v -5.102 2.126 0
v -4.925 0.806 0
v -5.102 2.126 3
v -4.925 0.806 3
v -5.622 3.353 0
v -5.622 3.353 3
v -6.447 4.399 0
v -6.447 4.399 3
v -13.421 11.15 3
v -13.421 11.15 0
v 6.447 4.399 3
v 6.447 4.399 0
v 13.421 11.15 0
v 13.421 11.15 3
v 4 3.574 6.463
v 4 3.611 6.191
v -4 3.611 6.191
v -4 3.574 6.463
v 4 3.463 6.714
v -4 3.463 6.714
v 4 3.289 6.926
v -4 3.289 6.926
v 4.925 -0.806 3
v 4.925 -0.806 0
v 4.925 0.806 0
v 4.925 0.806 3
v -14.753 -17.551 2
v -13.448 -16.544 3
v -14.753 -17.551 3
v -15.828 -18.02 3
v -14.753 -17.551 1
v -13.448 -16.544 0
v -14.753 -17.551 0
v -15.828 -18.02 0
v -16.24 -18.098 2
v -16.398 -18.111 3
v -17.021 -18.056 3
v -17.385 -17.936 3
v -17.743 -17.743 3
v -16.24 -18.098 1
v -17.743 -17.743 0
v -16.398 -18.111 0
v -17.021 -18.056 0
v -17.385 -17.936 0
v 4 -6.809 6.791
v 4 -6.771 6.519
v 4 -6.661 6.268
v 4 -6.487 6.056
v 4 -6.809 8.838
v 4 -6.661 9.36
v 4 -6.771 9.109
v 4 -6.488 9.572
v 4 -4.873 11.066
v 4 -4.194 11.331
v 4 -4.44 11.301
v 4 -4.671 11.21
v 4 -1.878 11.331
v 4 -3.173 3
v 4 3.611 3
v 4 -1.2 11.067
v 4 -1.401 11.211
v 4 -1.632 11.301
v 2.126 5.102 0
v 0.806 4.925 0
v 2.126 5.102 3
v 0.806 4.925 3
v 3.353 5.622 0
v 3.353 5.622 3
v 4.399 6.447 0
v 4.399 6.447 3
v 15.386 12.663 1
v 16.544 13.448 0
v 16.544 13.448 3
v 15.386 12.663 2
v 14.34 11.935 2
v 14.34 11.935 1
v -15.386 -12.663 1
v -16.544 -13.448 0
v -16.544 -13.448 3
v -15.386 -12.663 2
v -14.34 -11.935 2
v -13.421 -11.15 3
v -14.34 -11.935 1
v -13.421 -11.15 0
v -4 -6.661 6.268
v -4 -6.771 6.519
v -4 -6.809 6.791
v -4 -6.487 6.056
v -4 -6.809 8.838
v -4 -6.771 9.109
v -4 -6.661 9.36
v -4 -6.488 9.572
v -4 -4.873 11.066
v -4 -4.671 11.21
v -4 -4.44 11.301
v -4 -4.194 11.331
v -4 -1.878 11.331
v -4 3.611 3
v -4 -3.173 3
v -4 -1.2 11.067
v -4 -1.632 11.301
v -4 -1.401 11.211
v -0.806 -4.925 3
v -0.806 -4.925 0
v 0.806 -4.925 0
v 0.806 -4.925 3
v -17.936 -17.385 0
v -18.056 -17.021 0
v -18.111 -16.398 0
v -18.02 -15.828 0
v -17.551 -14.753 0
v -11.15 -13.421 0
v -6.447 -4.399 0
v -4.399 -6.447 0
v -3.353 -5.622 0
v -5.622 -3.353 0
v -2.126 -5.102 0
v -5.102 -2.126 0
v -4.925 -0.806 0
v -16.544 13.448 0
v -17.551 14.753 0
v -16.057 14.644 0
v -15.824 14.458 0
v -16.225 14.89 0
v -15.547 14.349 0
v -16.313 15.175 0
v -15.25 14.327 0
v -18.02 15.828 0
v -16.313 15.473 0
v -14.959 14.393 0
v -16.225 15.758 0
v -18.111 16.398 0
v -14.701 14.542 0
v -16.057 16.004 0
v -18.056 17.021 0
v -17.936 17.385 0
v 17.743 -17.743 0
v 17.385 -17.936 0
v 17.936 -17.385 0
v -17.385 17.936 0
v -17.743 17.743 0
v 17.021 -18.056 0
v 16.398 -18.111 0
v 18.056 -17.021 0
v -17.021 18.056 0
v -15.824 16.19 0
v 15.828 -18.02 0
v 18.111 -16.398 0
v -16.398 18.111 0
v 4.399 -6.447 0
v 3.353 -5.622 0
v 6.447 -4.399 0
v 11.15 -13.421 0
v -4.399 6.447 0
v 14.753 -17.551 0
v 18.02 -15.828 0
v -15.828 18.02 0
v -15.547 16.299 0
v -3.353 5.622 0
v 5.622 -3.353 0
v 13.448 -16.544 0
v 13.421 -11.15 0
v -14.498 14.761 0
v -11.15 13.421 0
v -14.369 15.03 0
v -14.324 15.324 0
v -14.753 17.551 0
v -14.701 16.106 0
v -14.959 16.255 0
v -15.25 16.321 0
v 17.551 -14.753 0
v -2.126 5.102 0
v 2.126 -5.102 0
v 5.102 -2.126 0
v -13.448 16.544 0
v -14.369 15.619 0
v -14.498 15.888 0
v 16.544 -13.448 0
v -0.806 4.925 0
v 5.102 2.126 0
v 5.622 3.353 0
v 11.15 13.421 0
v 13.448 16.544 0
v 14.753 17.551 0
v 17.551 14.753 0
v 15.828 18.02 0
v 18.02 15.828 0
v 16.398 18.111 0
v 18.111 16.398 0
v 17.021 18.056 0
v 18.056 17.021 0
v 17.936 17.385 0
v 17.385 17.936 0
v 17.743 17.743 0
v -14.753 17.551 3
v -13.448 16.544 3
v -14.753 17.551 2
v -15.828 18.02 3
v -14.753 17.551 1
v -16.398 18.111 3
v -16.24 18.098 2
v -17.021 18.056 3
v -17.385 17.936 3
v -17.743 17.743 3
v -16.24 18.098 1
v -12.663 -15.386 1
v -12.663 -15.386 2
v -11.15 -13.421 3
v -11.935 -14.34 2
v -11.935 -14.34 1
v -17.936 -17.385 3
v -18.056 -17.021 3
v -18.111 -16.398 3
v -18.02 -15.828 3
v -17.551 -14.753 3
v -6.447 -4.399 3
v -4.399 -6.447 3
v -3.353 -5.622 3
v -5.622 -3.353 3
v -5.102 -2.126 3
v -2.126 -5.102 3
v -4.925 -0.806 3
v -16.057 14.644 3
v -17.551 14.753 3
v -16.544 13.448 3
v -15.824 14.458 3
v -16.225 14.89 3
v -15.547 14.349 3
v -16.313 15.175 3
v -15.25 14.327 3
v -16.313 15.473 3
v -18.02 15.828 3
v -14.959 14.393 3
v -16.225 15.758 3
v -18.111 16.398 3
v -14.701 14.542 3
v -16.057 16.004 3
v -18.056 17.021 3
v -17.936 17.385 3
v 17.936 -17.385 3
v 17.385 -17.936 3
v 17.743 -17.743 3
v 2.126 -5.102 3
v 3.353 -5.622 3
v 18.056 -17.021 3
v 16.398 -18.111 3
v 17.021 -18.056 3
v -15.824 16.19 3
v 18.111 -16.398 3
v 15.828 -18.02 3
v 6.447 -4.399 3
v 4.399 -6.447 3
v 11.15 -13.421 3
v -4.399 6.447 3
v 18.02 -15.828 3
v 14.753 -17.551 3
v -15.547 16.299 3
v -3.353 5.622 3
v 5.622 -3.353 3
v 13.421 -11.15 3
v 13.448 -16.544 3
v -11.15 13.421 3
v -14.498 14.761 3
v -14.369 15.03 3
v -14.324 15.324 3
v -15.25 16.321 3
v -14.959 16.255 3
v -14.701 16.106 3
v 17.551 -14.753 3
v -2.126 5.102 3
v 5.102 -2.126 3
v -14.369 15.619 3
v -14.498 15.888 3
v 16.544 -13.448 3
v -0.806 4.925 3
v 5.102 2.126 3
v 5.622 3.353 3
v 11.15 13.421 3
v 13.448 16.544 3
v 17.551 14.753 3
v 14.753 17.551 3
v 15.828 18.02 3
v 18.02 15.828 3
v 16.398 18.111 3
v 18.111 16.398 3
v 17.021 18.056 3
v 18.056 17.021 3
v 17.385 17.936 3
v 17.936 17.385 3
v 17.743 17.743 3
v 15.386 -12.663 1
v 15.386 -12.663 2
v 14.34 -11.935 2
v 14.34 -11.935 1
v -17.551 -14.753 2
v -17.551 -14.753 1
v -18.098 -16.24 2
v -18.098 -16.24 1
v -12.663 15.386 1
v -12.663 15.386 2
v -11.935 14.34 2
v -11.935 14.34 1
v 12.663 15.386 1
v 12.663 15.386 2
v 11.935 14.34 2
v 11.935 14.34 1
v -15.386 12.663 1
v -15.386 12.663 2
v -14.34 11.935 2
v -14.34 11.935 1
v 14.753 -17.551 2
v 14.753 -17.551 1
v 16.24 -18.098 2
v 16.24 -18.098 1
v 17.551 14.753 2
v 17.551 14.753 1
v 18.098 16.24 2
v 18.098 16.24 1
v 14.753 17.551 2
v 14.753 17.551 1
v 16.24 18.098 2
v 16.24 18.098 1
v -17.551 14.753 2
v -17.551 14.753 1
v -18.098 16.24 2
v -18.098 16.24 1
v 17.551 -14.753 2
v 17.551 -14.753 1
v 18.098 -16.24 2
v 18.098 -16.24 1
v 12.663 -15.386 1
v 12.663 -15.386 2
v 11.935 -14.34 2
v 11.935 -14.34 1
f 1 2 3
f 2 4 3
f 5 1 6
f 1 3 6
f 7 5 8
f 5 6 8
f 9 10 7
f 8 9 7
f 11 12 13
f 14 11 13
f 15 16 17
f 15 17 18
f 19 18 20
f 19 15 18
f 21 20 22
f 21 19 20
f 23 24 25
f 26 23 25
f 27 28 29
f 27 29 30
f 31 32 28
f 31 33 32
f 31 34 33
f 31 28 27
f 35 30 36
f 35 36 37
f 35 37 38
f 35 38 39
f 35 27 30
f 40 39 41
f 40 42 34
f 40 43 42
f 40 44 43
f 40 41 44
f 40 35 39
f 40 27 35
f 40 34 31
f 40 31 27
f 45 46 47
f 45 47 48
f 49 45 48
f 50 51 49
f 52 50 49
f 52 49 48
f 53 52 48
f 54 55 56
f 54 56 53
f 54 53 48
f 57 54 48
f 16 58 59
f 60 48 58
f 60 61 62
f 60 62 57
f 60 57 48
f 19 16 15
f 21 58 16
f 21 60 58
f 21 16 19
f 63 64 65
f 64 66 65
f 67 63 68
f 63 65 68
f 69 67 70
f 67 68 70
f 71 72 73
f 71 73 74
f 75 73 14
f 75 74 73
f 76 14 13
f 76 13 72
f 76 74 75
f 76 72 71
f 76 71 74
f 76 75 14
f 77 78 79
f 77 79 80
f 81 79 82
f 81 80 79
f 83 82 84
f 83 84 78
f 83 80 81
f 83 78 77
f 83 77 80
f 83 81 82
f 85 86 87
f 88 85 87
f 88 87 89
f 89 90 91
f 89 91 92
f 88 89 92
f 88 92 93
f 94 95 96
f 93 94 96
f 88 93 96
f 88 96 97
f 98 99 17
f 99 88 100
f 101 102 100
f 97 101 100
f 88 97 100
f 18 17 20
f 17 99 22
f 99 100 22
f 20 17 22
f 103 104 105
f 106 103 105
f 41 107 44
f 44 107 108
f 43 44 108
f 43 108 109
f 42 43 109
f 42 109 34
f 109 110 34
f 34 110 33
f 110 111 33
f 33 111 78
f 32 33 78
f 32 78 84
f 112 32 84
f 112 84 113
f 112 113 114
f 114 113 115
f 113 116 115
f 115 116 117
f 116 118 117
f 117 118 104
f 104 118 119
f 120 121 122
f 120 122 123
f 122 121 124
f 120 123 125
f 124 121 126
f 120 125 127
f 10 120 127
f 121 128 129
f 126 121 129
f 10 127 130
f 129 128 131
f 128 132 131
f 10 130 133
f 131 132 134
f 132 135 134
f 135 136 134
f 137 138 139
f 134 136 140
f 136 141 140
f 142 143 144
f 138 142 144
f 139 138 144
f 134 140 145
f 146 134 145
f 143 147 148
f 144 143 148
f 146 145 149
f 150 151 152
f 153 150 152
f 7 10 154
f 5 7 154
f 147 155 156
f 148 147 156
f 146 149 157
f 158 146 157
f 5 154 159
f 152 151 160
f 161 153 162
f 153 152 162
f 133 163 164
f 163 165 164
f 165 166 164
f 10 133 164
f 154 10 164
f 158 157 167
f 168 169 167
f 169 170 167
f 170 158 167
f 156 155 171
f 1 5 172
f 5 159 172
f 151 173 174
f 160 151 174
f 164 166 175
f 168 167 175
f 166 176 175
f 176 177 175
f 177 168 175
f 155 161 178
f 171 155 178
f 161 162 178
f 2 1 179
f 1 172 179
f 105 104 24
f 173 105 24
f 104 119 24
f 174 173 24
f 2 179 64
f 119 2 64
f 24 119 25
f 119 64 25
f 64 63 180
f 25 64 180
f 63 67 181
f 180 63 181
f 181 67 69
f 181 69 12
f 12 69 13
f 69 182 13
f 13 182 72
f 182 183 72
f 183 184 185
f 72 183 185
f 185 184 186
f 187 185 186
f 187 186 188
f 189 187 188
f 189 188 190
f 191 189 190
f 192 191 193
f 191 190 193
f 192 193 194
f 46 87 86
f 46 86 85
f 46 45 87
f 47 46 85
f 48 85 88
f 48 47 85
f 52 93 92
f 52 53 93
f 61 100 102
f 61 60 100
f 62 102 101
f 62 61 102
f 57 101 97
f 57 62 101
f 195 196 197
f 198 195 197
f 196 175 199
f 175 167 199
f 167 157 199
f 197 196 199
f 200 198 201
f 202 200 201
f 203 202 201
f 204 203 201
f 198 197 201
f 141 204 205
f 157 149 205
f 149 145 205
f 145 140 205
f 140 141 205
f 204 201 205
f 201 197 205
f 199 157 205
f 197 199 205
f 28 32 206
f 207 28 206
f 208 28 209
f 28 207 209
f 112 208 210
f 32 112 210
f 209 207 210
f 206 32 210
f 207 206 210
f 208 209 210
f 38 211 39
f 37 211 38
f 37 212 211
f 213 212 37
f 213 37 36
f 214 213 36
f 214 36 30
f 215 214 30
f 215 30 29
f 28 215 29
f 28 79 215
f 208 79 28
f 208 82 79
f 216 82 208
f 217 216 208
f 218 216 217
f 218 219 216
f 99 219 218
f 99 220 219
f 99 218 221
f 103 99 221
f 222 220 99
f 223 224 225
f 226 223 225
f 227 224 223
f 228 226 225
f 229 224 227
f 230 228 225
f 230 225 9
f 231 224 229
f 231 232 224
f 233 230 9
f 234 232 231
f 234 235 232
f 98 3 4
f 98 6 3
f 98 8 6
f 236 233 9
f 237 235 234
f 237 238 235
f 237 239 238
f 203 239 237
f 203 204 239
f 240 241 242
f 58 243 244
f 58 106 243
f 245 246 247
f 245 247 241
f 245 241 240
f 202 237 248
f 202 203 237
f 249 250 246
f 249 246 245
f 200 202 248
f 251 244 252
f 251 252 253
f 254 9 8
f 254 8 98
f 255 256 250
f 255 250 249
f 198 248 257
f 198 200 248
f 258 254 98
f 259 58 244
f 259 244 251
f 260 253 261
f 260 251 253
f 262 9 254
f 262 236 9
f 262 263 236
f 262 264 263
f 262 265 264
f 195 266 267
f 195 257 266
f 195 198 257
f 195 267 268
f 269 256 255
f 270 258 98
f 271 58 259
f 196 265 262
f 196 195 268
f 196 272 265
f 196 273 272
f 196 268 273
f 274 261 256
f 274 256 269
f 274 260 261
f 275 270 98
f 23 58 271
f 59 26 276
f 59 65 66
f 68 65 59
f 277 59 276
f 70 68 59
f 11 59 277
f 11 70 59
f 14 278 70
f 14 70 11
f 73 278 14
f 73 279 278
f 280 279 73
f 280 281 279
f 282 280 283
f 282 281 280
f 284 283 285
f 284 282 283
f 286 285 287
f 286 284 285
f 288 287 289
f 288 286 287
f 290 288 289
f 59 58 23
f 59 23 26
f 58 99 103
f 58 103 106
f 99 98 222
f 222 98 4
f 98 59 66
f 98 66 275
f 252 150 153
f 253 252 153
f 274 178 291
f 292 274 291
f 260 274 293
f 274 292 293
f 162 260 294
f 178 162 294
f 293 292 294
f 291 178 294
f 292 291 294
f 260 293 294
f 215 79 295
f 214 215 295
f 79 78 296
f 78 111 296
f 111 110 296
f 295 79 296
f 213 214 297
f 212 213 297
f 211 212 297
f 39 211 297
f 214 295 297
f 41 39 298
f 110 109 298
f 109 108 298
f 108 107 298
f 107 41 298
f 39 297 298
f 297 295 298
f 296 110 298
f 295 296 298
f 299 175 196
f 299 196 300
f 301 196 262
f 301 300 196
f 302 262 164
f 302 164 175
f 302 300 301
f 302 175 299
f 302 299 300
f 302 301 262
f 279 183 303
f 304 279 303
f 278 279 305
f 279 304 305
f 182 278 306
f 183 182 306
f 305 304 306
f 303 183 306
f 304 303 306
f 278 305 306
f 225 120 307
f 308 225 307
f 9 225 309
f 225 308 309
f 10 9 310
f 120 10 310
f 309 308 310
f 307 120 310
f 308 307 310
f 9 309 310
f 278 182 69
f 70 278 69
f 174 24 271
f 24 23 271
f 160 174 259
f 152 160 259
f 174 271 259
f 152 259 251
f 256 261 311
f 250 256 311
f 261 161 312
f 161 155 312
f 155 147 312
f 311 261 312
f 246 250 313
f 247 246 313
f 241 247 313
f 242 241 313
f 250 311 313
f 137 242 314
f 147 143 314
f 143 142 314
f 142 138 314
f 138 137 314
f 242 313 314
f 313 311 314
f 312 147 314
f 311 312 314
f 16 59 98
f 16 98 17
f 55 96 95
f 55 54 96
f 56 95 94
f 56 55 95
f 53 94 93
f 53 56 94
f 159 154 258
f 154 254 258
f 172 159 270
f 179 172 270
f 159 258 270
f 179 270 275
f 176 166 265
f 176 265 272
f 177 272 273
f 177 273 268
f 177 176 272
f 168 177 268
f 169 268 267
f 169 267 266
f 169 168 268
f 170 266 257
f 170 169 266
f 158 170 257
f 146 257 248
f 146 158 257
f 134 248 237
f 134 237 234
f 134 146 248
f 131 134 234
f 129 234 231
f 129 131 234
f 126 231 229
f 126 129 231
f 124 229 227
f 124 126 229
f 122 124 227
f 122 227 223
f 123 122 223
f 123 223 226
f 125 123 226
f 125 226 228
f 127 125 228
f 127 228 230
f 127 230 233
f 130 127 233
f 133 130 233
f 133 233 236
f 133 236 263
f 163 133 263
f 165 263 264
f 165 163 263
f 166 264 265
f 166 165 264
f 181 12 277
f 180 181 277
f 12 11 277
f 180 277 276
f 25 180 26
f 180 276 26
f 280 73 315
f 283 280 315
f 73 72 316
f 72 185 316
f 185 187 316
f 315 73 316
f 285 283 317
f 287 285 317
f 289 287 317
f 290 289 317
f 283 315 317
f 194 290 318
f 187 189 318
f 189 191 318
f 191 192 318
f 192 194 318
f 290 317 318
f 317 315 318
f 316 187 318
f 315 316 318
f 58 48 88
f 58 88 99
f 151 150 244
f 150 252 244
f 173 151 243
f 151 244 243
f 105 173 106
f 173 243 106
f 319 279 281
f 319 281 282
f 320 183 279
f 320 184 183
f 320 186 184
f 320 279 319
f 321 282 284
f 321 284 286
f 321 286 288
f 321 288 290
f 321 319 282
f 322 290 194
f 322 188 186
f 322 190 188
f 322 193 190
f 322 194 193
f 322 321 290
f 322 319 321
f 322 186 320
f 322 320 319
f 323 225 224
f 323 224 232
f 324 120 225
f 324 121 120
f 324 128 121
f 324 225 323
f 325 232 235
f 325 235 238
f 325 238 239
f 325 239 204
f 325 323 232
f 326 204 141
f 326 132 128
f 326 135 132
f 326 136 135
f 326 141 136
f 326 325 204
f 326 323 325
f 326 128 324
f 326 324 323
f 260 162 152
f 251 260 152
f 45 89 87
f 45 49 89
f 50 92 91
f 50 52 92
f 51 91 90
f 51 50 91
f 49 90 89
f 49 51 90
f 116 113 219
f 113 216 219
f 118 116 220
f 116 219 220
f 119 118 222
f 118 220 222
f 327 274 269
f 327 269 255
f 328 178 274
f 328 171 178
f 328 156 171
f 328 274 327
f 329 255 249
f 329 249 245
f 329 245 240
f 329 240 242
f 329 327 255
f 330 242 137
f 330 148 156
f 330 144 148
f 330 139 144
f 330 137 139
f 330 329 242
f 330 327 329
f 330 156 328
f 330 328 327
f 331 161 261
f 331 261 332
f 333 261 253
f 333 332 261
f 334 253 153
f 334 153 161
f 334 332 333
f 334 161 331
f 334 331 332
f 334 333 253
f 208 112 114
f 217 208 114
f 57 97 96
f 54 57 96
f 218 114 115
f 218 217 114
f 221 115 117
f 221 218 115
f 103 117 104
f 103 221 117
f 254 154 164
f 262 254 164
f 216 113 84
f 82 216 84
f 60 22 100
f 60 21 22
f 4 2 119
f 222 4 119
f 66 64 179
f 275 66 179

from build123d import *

# Parameters (mm, degrees)
F0_R          = 1
F1_DEPTH      = 3
F3_DEPTH      = 4
F3_DEPTH_BACK = 4
F4_R          = 5


with BuildPart() as f1:
    # F0 (on Top) → F1 (new body)
    with BuildSketch(Plane.XY):
        with BuildLine():
            ThreePointArc((-4.924908, -2.924908), (-4.339122, -4.339122), (-2.924908, -4.924908))
            Line((-2.924908, -4.924908), (2.924908, -4.924908))
            ThreePointArc((2.924908, -4.924908), (4.339122, -4.339122), (4.924908, -2.924908))
            Line((4.924908, -2.924908), (4.924908, 2.924908))
            ThreePointArc((4.924908, 2.924908), (4.339122, 4.339122), (2.924908, 4.924908))
            Line((2.924908, 4.924908), (-2.924908, 4.924908))
            ThreePointArc((-2.924908, 4.924908), (-4.339122, 4.339122), (-4.924908, 2.924908))
            Line((-4.924908, 2.924908), (-4.924908, -2.924908))
        make_face()
        with BuildLine():
            Line((-11.150462, -13.421226), (-2.924908, -4.924908))
            ThreePointArc((-2.924908, -4.924908), (-4.339122, -4.339122), (-4.924908, -2.924908))
            Line((-4.924908, -2.924908), (-13.421226, -11.150462))
            add(Edge.make_bspline(
                [(-16.544489, -13.448271), (-15.335972, -12.597233), (-14.270634, -12.001318), (-13.421226, -11.150462)],
                knots=[0, 0, 0, 0, 3.87746, 3.87746, 3.87746, 3.87746], degree=3))
            add(Edge.make_bspline(
                [(-16.544489, -13.448271), (-17.632553, -14.607294), (-18.696965, -16.286609), (-17.743413, -17.743413)],
                knots=[0, 0, 0, 0, 4.459169, 4.459169, 4.459169, 4.459169], degree=3))
            add(Edge.make_bspline(
                [(-13.448271, -16.544489), (-14.607294, -17.632553), (-16.286609, -18.696965), (-17.743413, -17.743413)],
                knots=[0, 0, 0, 0, 4.459169, 4.459169, 4.459169, 4.459169], degree=3))
            add(Edge.make_bspline(
                [(-13.448271, -16.544489), (-12.597233, -15.335972), (-12.001318, -14.270634), (-11.150462, -13.421226)],
                knots=[0, 0, 0, 0, 3.87746, 3.87746, 3.87746, 3.87746], degree=3))
        make_face()
        with BuildLine():
            ThreePointArc((4.924908, -2.924908), (4.339122, -4.339122), (2.924908, -4.924908))
            Line((2.924908, -4.924908), (11.150462, -13.421226))
            add(Edge.make_bspline(
                [(13.448271, -16.544489), (12.597233, -15.335972), (12.001318, -14.270634), (11.150462, -13.421226)],
                knots=[0, 0, 0, 0, 3.87746, 3.87746, 3.87746, 3.87746], degree=3))
            add(Edge.make_bspline(
                [(13.448271, -16.544489), (14.607294, -17.632553), (16.286609, -18.696965), (17.743413, -17.743413)],
                knots=[0, 0, 0, 0, 4.459169, 4.459169, 4.459169, 4.459169], degree=3))
            add(Edge.make_bspline(
                [(16.544489, -13.448271), (17.632553, -14.607294), (18.696965, -16.286609), (17.743413, -17.743413)],
                knots=[0, 0, 0, 0, 4.459169, 4.459169, 4.459169, 4.459169], degree=3))
            add(Edge.make_bspline(
                [(16.544489, -13.448271), (15.335972, -12.597233), (14.270634, -12.001318), (13.421226, -11.150462)],
                knots=[0, 0, 0, 0, 3.87746, 3.87746, 3.87746, 3.87746], degree=3))
            Line((13.421226, -11.150462), (4.924908, -2.924908))
        make_face()
        with BuildLine():
            Line((-13.421226, 11.150462), (-4.924908, 2.924908))
            ThreePointArc((-4.924908, 2.924908), (-4.339122, 4.339122), (-2.924908, 4.924908))
            Line((-2.924908, 4.924908), (-11.150462, 13.421226))
            add(Edge.make_bspline(
                [(-13.448271, 16.544489), (-12.597233, 15.335972), (-12.001318, 14.270634), (-11.150462, 13.421226)],
                knots=[0, 0, 0, 0, 3.87746, 3.87746, 3.87746, 3.87746], degree=3))
            add(Edge.make_bspline(
                [(-13.448271, 16.544489), (-14.607294, 17.632553), (-16.286609, 18.696965), (-17.743413, 17.743413)],
                knots=[0, 0, 0, 0, 4.459169, 4.459169, 4.459169, 4.459169], degree=3))
            add(Edge.make_bspline(
                [(-16.544489, 13.448271), (-17.632553, 14.607294), (-18.696965, 16.286609), (-17.743413, 17.743413)],
                knots=[0, 0, 0, 0, 4.459169, 4.459169, 4.459169, 4.459169], degree=3))
            add(Edge.make_bspline(
                [(-16.544489, 13.448271), (-15.335972, 12.597233), (-14.270634, 12.001318), (-13.421226, 11.150462)],
                knots=[0, 0, 0, 0, 3.87746, 3.87746, 3.87746, 3.87746], degree=3))
        make_face()
        with Locations((-15.324265, 15.324265)):
            Circle(F0_R, mode=Mode.SUBTRACT)
        with BuildLine():
            ThreePointArc((2.924908, 4.924908), (4.339122, 4.339122), (4.924908, 2.924908))
            Line((4.924908, 2.924908), (13.421226, 11.150462))
            add(Edge.make_bspline(
                [(16.544489, 13.448271), (15.335972, 12.597233), (14.270634, 12.001318), (13.421226, 11.150462)],
                knots=[0, 0, 0, 0, 3.87746, 3.87746, 3.87746, 3.87746], degree=3))
            add(Edge.make_bspline(
                [(16.544489, 13.448271), (17.632553, 14.607294), (18.696965, 16.286609), (17.743413, 17.743413)],
                knots=[0, 0, 0, 0, 4.459169, 4.459169, 4.459169, 4.459169], degree=3))
            add(Edge.make_bspline(
                [(13.448271, 16.544489), (14.607294, 17.632553), (16.286609, 18.696965), (17.743413, 17.743413)],
                knots=[0, 0, 0, 0, 4.459169, 4.459169, 4.459169, 4.459169], degree=3))
            add(Edge.make_bspline(
                [(13.448271, 16.544489), (12.597233, 15.335972), (12.001318, 14.270634), (11.150462, 13.421226)],
                knots=[0, 0, 0, 0, 3.87746, 3.87746, 3.87746, 3.87746], degree=3))
            Line((11.150462, 13.421226), (2.924908, 4.924908))
        make_face()
    extrude(amount=F1_DEPTH)

    # F2 (on Right) → F3 (join, two sides)
    with BuildSketch(Plane.YZ) as f3_sk:
        with BuildLine():
            Line((-6.486704, 6.056156), (-3.156722, 2.984606))
            Line((-3.156722, 2.984606), (3.611223, 2.984606))
            Line((3.611223, 2.984606), (3.611223, 6.190739))
            ThreePointArc((3.611223, 6.190739), (3.527195, 6.591982), (3.289231, 6.925793))
            Line((3.289231, 6.925793), (-1.19991, 11.066544))
            ThreePointArc((-1.19991, 11.066544), (-1.51395, 11.262901), (-1.877918, 11.331489))
            Line((-1.877918, 11.331489), (-4.193702, 11.331489))
            ThreePointArc((-4.193702, 11.331489), (-4.558258, 11.262671), (-4.872638, 11.065687))
            Line((-4.872638, 11.065687), (-6.487631, 9.572253))
            ThreePointArc((-6.487631, 9.572253), (-6.72492, 9.23872), (-6.808695, 8.838055))
            Line((-6.808695, 8.838055), (-6.808695, 6.79121))
            ThreePointArc((-6.808695, 6.79121), (-6.724667, 6.389967), (-6.486704, 6.056156))
        make_face()
    extrude(amount=F3_DEPTH)
    extrude(f3_sk.sketch, amount=-F3_DEPTH_BACK)

    # F4
    f4_edges = [f1.edges().sort_by_distance(p)[0] for p in [
        (4.924908, -2.924908, 1.5),
        (4.924908, 2.924908, 1.5),
        (2.924908, 4.924908, 1.5),
        (-2.924908, 4.924908, 1.5),
        (-4.924908, 2.924908, 1.5),
        (-4.924908, -2.924908, 1.5),
        (-2.924908, -4.924908, 1.5),
        (2.924908, -4.924908, 1.5),
    ]]
    fillet(f4_edges, radius=F4_R)


solid = f1.part
